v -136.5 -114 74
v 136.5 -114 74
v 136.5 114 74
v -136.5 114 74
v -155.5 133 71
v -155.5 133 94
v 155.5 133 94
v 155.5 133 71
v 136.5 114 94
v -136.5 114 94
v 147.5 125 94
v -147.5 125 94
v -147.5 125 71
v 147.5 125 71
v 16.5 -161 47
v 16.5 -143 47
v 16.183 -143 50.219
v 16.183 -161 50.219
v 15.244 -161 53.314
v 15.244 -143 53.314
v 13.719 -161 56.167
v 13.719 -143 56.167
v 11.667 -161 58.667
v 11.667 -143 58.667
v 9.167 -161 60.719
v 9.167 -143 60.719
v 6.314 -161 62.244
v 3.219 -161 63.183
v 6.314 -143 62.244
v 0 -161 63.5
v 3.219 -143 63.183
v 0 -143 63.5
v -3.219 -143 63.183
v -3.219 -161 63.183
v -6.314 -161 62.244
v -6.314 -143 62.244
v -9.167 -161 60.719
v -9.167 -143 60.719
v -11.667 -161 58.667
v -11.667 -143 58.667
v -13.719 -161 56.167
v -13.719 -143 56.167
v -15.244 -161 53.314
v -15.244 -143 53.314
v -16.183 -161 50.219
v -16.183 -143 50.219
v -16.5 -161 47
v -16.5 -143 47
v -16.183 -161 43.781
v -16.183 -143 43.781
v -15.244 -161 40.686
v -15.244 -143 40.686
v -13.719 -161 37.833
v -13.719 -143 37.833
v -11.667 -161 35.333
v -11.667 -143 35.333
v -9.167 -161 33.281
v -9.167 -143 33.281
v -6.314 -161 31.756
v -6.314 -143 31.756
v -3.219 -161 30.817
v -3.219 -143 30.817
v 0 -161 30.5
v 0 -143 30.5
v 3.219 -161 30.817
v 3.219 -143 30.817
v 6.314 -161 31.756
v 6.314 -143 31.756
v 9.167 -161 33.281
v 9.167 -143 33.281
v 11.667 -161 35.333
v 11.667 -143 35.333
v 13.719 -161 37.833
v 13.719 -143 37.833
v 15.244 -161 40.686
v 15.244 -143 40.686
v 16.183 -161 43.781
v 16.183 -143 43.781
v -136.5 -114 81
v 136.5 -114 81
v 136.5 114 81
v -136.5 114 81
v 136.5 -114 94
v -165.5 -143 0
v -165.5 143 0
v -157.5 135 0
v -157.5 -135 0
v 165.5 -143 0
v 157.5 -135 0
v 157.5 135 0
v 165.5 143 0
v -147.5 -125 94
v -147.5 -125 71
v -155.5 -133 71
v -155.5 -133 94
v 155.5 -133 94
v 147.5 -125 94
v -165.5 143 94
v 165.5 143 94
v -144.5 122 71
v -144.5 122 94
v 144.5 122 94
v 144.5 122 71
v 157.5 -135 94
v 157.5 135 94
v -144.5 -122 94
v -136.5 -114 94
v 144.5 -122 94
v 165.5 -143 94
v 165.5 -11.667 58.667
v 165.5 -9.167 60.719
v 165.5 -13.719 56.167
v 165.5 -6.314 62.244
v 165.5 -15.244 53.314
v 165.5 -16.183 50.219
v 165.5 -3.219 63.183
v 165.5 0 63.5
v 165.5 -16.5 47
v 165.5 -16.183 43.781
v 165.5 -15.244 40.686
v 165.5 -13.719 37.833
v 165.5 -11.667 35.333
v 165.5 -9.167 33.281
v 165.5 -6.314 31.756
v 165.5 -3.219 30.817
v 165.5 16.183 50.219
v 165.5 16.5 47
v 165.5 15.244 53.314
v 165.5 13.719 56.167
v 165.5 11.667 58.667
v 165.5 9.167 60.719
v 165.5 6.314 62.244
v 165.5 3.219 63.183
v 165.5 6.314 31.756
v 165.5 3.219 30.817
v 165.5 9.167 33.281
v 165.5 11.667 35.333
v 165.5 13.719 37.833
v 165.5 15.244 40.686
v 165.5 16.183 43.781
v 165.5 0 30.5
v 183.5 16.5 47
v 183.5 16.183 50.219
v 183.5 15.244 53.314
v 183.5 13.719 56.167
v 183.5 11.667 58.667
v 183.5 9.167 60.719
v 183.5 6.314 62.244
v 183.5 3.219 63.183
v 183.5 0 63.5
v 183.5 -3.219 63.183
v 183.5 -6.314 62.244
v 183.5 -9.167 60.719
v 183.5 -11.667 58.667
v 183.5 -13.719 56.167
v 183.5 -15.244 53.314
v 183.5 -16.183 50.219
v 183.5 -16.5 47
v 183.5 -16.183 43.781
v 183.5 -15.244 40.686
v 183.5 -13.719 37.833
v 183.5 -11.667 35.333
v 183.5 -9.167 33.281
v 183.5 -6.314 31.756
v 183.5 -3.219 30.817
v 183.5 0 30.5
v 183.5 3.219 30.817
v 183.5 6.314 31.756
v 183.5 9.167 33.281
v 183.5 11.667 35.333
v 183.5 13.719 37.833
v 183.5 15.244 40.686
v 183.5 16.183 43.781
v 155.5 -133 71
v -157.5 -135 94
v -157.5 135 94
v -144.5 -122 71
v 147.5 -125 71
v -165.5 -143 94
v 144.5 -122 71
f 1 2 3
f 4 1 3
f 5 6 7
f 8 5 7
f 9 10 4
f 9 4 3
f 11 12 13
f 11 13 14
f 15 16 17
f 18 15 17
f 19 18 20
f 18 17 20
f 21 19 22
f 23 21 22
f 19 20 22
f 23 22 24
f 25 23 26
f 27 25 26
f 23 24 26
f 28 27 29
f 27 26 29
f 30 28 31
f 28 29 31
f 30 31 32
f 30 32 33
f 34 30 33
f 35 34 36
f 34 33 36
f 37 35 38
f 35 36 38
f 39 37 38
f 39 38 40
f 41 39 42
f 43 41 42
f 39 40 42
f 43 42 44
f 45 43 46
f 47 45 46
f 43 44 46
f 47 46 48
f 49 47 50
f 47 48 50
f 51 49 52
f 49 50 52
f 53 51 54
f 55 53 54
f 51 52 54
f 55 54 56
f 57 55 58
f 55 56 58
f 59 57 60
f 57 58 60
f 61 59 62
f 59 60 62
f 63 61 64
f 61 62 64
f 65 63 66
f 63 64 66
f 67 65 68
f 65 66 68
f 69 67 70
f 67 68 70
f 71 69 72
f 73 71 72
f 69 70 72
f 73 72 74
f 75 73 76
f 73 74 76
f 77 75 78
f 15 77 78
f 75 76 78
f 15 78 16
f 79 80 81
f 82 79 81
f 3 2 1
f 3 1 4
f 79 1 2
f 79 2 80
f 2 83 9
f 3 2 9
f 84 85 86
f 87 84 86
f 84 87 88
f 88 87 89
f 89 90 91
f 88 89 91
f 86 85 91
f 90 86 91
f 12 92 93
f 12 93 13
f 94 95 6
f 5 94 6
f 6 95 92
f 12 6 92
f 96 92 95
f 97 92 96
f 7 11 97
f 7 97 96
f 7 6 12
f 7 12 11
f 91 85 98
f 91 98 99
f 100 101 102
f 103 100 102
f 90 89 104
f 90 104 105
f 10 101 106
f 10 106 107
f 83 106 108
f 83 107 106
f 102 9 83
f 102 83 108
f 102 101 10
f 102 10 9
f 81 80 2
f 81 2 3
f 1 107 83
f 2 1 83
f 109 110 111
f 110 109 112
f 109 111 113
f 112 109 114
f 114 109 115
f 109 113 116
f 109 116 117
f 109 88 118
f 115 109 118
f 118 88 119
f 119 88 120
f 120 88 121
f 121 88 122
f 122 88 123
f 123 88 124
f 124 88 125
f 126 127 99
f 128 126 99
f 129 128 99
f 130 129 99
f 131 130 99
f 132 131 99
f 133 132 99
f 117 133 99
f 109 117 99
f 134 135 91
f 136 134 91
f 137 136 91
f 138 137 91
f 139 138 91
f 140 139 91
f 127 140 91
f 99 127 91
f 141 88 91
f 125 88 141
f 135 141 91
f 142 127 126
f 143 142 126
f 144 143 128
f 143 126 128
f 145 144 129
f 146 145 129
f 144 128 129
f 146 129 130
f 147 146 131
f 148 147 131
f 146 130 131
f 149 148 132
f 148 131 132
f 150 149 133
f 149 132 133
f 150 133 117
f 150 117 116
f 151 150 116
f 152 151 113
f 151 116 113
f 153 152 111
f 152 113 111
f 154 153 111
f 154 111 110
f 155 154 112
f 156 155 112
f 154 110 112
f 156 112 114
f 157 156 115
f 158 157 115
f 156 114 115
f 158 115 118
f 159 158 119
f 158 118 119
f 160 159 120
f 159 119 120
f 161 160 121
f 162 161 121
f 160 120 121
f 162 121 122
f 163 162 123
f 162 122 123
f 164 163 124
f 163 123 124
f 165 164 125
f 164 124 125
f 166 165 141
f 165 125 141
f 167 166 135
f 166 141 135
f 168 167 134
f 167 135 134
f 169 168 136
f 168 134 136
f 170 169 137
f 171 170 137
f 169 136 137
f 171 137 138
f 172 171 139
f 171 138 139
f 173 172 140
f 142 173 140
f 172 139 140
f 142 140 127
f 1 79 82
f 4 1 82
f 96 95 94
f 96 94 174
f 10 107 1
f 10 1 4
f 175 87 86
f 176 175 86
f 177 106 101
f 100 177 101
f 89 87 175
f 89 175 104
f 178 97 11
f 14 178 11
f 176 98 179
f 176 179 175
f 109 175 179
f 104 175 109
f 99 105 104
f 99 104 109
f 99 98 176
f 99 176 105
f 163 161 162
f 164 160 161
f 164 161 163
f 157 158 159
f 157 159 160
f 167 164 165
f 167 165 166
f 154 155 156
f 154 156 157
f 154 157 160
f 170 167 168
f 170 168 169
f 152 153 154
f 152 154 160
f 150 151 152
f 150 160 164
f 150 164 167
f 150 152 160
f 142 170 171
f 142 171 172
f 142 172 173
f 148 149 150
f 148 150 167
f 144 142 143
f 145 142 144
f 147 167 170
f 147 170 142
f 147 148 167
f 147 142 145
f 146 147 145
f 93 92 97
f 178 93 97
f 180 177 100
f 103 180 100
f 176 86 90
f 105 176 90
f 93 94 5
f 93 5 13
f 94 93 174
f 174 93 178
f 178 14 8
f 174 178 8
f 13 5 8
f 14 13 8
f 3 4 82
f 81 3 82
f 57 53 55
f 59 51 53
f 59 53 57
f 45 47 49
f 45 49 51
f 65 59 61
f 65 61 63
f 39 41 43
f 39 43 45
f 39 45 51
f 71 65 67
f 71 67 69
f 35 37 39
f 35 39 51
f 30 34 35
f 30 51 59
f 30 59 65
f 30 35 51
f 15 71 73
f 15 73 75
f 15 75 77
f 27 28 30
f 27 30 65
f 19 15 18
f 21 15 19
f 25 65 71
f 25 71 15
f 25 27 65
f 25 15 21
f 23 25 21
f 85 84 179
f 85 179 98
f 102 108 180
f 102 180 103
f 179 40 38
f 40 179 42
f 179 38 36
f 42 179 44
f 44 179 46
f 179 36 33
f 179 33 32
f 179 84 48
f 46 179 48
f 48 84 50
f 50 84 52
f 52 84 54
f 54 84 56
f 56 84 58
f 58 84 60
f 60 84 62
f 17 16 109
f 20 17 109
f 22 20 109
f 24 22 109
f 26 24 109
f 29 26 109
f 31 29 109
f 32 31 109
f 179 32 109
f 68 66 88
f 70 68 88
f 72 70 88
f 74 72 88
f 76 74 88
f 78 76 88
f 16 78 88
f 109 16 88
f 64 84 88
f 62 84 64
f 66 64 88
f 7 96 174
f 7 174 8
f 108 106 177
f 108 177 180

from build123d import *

# Parameters (mm, degrees)
F0_W      = 331
F0_H      = 286
F0_W_2    = 315
F0_H_2    = 270
F1_DEPTH  = 94
F2_R      = 16.5
F3_DEPTH  = 18
F4_R      = 16.5
F5_DEPTH  = 18
F6_W      = 311
F6_H      = 266
F6_W_2    = 295
F6_H_2    = 250
F6_W_3    = 289
F6_H_3    = 244
F6_W_4    = 273
F6_H_4    = 228
F7_DEPTH  = 23
F8_W      = 228
F8_H      = 3
F9_DEPTH  = 273
F10_W     = 228
F10_H     = 7
F11_DEPTH = 273


with BuildPart() as f1:
    # F0 (on Top) → F1 (new body)
    with BuildSketch(Plane.XY):
        Rectangle(F0_W, F0_H)
        Rectangle(F0_W_2, F0_H_2, mode=Mode.SUBTRACT)
    extrude(amount=F1_DEPTH)

    # F2 (on face) → F3 (join)
    with BuildSketch(Plane.YZ.offset(165.5)):
        with Locations((0, 47)):
            Circle(F2_R)
    extrude(amount=F3_DEPTH)

    # F4 (on face) → F5 (join)
    with BuildSketch(Plane.XZ.offset(143)):
        with Locations((0, 47)):
            Circle(F4_R)
    extrude(amount=F5_DEPTH)


with BuildPart() as f7:
    # F6 (on face) → F7 (new body)
    with BuildSketch(Plane.XY.offset(94)):
        Rectangle(F6_W, F6_H)
        Rectangle(F6_W_2, F6_H_2, mode=Mode.SUBTRACT)
        Rectangle(F6_W_3, F6_H_3)
        Rectangle(F6_W_4, F6_H_4, mode=Mode.SUBTRACT)
    extrude(amount=-F7_DEPTH)

    # F8 (on face) → F9 (join, through all)
    with BuildSketch(Plane.YZ.offset(-136.5)):
        with Locations((0, 72.5)):
            Rectangle(F8_W, F8_H)
    extrude(amount=F9_DEPTH)


with BuildPart() as f11:
    # F10 (on face) → F11 (new body, through all)
    with BuildSketch(Plane.YZ.offset(-136.5)):
        with Locations((0, 77.5)):
            Rectangle(F10_W, F10_H)
    extrude(amount=F11_DEPTH)


solid = Compound([f1.part, f7.part, f11.part])
